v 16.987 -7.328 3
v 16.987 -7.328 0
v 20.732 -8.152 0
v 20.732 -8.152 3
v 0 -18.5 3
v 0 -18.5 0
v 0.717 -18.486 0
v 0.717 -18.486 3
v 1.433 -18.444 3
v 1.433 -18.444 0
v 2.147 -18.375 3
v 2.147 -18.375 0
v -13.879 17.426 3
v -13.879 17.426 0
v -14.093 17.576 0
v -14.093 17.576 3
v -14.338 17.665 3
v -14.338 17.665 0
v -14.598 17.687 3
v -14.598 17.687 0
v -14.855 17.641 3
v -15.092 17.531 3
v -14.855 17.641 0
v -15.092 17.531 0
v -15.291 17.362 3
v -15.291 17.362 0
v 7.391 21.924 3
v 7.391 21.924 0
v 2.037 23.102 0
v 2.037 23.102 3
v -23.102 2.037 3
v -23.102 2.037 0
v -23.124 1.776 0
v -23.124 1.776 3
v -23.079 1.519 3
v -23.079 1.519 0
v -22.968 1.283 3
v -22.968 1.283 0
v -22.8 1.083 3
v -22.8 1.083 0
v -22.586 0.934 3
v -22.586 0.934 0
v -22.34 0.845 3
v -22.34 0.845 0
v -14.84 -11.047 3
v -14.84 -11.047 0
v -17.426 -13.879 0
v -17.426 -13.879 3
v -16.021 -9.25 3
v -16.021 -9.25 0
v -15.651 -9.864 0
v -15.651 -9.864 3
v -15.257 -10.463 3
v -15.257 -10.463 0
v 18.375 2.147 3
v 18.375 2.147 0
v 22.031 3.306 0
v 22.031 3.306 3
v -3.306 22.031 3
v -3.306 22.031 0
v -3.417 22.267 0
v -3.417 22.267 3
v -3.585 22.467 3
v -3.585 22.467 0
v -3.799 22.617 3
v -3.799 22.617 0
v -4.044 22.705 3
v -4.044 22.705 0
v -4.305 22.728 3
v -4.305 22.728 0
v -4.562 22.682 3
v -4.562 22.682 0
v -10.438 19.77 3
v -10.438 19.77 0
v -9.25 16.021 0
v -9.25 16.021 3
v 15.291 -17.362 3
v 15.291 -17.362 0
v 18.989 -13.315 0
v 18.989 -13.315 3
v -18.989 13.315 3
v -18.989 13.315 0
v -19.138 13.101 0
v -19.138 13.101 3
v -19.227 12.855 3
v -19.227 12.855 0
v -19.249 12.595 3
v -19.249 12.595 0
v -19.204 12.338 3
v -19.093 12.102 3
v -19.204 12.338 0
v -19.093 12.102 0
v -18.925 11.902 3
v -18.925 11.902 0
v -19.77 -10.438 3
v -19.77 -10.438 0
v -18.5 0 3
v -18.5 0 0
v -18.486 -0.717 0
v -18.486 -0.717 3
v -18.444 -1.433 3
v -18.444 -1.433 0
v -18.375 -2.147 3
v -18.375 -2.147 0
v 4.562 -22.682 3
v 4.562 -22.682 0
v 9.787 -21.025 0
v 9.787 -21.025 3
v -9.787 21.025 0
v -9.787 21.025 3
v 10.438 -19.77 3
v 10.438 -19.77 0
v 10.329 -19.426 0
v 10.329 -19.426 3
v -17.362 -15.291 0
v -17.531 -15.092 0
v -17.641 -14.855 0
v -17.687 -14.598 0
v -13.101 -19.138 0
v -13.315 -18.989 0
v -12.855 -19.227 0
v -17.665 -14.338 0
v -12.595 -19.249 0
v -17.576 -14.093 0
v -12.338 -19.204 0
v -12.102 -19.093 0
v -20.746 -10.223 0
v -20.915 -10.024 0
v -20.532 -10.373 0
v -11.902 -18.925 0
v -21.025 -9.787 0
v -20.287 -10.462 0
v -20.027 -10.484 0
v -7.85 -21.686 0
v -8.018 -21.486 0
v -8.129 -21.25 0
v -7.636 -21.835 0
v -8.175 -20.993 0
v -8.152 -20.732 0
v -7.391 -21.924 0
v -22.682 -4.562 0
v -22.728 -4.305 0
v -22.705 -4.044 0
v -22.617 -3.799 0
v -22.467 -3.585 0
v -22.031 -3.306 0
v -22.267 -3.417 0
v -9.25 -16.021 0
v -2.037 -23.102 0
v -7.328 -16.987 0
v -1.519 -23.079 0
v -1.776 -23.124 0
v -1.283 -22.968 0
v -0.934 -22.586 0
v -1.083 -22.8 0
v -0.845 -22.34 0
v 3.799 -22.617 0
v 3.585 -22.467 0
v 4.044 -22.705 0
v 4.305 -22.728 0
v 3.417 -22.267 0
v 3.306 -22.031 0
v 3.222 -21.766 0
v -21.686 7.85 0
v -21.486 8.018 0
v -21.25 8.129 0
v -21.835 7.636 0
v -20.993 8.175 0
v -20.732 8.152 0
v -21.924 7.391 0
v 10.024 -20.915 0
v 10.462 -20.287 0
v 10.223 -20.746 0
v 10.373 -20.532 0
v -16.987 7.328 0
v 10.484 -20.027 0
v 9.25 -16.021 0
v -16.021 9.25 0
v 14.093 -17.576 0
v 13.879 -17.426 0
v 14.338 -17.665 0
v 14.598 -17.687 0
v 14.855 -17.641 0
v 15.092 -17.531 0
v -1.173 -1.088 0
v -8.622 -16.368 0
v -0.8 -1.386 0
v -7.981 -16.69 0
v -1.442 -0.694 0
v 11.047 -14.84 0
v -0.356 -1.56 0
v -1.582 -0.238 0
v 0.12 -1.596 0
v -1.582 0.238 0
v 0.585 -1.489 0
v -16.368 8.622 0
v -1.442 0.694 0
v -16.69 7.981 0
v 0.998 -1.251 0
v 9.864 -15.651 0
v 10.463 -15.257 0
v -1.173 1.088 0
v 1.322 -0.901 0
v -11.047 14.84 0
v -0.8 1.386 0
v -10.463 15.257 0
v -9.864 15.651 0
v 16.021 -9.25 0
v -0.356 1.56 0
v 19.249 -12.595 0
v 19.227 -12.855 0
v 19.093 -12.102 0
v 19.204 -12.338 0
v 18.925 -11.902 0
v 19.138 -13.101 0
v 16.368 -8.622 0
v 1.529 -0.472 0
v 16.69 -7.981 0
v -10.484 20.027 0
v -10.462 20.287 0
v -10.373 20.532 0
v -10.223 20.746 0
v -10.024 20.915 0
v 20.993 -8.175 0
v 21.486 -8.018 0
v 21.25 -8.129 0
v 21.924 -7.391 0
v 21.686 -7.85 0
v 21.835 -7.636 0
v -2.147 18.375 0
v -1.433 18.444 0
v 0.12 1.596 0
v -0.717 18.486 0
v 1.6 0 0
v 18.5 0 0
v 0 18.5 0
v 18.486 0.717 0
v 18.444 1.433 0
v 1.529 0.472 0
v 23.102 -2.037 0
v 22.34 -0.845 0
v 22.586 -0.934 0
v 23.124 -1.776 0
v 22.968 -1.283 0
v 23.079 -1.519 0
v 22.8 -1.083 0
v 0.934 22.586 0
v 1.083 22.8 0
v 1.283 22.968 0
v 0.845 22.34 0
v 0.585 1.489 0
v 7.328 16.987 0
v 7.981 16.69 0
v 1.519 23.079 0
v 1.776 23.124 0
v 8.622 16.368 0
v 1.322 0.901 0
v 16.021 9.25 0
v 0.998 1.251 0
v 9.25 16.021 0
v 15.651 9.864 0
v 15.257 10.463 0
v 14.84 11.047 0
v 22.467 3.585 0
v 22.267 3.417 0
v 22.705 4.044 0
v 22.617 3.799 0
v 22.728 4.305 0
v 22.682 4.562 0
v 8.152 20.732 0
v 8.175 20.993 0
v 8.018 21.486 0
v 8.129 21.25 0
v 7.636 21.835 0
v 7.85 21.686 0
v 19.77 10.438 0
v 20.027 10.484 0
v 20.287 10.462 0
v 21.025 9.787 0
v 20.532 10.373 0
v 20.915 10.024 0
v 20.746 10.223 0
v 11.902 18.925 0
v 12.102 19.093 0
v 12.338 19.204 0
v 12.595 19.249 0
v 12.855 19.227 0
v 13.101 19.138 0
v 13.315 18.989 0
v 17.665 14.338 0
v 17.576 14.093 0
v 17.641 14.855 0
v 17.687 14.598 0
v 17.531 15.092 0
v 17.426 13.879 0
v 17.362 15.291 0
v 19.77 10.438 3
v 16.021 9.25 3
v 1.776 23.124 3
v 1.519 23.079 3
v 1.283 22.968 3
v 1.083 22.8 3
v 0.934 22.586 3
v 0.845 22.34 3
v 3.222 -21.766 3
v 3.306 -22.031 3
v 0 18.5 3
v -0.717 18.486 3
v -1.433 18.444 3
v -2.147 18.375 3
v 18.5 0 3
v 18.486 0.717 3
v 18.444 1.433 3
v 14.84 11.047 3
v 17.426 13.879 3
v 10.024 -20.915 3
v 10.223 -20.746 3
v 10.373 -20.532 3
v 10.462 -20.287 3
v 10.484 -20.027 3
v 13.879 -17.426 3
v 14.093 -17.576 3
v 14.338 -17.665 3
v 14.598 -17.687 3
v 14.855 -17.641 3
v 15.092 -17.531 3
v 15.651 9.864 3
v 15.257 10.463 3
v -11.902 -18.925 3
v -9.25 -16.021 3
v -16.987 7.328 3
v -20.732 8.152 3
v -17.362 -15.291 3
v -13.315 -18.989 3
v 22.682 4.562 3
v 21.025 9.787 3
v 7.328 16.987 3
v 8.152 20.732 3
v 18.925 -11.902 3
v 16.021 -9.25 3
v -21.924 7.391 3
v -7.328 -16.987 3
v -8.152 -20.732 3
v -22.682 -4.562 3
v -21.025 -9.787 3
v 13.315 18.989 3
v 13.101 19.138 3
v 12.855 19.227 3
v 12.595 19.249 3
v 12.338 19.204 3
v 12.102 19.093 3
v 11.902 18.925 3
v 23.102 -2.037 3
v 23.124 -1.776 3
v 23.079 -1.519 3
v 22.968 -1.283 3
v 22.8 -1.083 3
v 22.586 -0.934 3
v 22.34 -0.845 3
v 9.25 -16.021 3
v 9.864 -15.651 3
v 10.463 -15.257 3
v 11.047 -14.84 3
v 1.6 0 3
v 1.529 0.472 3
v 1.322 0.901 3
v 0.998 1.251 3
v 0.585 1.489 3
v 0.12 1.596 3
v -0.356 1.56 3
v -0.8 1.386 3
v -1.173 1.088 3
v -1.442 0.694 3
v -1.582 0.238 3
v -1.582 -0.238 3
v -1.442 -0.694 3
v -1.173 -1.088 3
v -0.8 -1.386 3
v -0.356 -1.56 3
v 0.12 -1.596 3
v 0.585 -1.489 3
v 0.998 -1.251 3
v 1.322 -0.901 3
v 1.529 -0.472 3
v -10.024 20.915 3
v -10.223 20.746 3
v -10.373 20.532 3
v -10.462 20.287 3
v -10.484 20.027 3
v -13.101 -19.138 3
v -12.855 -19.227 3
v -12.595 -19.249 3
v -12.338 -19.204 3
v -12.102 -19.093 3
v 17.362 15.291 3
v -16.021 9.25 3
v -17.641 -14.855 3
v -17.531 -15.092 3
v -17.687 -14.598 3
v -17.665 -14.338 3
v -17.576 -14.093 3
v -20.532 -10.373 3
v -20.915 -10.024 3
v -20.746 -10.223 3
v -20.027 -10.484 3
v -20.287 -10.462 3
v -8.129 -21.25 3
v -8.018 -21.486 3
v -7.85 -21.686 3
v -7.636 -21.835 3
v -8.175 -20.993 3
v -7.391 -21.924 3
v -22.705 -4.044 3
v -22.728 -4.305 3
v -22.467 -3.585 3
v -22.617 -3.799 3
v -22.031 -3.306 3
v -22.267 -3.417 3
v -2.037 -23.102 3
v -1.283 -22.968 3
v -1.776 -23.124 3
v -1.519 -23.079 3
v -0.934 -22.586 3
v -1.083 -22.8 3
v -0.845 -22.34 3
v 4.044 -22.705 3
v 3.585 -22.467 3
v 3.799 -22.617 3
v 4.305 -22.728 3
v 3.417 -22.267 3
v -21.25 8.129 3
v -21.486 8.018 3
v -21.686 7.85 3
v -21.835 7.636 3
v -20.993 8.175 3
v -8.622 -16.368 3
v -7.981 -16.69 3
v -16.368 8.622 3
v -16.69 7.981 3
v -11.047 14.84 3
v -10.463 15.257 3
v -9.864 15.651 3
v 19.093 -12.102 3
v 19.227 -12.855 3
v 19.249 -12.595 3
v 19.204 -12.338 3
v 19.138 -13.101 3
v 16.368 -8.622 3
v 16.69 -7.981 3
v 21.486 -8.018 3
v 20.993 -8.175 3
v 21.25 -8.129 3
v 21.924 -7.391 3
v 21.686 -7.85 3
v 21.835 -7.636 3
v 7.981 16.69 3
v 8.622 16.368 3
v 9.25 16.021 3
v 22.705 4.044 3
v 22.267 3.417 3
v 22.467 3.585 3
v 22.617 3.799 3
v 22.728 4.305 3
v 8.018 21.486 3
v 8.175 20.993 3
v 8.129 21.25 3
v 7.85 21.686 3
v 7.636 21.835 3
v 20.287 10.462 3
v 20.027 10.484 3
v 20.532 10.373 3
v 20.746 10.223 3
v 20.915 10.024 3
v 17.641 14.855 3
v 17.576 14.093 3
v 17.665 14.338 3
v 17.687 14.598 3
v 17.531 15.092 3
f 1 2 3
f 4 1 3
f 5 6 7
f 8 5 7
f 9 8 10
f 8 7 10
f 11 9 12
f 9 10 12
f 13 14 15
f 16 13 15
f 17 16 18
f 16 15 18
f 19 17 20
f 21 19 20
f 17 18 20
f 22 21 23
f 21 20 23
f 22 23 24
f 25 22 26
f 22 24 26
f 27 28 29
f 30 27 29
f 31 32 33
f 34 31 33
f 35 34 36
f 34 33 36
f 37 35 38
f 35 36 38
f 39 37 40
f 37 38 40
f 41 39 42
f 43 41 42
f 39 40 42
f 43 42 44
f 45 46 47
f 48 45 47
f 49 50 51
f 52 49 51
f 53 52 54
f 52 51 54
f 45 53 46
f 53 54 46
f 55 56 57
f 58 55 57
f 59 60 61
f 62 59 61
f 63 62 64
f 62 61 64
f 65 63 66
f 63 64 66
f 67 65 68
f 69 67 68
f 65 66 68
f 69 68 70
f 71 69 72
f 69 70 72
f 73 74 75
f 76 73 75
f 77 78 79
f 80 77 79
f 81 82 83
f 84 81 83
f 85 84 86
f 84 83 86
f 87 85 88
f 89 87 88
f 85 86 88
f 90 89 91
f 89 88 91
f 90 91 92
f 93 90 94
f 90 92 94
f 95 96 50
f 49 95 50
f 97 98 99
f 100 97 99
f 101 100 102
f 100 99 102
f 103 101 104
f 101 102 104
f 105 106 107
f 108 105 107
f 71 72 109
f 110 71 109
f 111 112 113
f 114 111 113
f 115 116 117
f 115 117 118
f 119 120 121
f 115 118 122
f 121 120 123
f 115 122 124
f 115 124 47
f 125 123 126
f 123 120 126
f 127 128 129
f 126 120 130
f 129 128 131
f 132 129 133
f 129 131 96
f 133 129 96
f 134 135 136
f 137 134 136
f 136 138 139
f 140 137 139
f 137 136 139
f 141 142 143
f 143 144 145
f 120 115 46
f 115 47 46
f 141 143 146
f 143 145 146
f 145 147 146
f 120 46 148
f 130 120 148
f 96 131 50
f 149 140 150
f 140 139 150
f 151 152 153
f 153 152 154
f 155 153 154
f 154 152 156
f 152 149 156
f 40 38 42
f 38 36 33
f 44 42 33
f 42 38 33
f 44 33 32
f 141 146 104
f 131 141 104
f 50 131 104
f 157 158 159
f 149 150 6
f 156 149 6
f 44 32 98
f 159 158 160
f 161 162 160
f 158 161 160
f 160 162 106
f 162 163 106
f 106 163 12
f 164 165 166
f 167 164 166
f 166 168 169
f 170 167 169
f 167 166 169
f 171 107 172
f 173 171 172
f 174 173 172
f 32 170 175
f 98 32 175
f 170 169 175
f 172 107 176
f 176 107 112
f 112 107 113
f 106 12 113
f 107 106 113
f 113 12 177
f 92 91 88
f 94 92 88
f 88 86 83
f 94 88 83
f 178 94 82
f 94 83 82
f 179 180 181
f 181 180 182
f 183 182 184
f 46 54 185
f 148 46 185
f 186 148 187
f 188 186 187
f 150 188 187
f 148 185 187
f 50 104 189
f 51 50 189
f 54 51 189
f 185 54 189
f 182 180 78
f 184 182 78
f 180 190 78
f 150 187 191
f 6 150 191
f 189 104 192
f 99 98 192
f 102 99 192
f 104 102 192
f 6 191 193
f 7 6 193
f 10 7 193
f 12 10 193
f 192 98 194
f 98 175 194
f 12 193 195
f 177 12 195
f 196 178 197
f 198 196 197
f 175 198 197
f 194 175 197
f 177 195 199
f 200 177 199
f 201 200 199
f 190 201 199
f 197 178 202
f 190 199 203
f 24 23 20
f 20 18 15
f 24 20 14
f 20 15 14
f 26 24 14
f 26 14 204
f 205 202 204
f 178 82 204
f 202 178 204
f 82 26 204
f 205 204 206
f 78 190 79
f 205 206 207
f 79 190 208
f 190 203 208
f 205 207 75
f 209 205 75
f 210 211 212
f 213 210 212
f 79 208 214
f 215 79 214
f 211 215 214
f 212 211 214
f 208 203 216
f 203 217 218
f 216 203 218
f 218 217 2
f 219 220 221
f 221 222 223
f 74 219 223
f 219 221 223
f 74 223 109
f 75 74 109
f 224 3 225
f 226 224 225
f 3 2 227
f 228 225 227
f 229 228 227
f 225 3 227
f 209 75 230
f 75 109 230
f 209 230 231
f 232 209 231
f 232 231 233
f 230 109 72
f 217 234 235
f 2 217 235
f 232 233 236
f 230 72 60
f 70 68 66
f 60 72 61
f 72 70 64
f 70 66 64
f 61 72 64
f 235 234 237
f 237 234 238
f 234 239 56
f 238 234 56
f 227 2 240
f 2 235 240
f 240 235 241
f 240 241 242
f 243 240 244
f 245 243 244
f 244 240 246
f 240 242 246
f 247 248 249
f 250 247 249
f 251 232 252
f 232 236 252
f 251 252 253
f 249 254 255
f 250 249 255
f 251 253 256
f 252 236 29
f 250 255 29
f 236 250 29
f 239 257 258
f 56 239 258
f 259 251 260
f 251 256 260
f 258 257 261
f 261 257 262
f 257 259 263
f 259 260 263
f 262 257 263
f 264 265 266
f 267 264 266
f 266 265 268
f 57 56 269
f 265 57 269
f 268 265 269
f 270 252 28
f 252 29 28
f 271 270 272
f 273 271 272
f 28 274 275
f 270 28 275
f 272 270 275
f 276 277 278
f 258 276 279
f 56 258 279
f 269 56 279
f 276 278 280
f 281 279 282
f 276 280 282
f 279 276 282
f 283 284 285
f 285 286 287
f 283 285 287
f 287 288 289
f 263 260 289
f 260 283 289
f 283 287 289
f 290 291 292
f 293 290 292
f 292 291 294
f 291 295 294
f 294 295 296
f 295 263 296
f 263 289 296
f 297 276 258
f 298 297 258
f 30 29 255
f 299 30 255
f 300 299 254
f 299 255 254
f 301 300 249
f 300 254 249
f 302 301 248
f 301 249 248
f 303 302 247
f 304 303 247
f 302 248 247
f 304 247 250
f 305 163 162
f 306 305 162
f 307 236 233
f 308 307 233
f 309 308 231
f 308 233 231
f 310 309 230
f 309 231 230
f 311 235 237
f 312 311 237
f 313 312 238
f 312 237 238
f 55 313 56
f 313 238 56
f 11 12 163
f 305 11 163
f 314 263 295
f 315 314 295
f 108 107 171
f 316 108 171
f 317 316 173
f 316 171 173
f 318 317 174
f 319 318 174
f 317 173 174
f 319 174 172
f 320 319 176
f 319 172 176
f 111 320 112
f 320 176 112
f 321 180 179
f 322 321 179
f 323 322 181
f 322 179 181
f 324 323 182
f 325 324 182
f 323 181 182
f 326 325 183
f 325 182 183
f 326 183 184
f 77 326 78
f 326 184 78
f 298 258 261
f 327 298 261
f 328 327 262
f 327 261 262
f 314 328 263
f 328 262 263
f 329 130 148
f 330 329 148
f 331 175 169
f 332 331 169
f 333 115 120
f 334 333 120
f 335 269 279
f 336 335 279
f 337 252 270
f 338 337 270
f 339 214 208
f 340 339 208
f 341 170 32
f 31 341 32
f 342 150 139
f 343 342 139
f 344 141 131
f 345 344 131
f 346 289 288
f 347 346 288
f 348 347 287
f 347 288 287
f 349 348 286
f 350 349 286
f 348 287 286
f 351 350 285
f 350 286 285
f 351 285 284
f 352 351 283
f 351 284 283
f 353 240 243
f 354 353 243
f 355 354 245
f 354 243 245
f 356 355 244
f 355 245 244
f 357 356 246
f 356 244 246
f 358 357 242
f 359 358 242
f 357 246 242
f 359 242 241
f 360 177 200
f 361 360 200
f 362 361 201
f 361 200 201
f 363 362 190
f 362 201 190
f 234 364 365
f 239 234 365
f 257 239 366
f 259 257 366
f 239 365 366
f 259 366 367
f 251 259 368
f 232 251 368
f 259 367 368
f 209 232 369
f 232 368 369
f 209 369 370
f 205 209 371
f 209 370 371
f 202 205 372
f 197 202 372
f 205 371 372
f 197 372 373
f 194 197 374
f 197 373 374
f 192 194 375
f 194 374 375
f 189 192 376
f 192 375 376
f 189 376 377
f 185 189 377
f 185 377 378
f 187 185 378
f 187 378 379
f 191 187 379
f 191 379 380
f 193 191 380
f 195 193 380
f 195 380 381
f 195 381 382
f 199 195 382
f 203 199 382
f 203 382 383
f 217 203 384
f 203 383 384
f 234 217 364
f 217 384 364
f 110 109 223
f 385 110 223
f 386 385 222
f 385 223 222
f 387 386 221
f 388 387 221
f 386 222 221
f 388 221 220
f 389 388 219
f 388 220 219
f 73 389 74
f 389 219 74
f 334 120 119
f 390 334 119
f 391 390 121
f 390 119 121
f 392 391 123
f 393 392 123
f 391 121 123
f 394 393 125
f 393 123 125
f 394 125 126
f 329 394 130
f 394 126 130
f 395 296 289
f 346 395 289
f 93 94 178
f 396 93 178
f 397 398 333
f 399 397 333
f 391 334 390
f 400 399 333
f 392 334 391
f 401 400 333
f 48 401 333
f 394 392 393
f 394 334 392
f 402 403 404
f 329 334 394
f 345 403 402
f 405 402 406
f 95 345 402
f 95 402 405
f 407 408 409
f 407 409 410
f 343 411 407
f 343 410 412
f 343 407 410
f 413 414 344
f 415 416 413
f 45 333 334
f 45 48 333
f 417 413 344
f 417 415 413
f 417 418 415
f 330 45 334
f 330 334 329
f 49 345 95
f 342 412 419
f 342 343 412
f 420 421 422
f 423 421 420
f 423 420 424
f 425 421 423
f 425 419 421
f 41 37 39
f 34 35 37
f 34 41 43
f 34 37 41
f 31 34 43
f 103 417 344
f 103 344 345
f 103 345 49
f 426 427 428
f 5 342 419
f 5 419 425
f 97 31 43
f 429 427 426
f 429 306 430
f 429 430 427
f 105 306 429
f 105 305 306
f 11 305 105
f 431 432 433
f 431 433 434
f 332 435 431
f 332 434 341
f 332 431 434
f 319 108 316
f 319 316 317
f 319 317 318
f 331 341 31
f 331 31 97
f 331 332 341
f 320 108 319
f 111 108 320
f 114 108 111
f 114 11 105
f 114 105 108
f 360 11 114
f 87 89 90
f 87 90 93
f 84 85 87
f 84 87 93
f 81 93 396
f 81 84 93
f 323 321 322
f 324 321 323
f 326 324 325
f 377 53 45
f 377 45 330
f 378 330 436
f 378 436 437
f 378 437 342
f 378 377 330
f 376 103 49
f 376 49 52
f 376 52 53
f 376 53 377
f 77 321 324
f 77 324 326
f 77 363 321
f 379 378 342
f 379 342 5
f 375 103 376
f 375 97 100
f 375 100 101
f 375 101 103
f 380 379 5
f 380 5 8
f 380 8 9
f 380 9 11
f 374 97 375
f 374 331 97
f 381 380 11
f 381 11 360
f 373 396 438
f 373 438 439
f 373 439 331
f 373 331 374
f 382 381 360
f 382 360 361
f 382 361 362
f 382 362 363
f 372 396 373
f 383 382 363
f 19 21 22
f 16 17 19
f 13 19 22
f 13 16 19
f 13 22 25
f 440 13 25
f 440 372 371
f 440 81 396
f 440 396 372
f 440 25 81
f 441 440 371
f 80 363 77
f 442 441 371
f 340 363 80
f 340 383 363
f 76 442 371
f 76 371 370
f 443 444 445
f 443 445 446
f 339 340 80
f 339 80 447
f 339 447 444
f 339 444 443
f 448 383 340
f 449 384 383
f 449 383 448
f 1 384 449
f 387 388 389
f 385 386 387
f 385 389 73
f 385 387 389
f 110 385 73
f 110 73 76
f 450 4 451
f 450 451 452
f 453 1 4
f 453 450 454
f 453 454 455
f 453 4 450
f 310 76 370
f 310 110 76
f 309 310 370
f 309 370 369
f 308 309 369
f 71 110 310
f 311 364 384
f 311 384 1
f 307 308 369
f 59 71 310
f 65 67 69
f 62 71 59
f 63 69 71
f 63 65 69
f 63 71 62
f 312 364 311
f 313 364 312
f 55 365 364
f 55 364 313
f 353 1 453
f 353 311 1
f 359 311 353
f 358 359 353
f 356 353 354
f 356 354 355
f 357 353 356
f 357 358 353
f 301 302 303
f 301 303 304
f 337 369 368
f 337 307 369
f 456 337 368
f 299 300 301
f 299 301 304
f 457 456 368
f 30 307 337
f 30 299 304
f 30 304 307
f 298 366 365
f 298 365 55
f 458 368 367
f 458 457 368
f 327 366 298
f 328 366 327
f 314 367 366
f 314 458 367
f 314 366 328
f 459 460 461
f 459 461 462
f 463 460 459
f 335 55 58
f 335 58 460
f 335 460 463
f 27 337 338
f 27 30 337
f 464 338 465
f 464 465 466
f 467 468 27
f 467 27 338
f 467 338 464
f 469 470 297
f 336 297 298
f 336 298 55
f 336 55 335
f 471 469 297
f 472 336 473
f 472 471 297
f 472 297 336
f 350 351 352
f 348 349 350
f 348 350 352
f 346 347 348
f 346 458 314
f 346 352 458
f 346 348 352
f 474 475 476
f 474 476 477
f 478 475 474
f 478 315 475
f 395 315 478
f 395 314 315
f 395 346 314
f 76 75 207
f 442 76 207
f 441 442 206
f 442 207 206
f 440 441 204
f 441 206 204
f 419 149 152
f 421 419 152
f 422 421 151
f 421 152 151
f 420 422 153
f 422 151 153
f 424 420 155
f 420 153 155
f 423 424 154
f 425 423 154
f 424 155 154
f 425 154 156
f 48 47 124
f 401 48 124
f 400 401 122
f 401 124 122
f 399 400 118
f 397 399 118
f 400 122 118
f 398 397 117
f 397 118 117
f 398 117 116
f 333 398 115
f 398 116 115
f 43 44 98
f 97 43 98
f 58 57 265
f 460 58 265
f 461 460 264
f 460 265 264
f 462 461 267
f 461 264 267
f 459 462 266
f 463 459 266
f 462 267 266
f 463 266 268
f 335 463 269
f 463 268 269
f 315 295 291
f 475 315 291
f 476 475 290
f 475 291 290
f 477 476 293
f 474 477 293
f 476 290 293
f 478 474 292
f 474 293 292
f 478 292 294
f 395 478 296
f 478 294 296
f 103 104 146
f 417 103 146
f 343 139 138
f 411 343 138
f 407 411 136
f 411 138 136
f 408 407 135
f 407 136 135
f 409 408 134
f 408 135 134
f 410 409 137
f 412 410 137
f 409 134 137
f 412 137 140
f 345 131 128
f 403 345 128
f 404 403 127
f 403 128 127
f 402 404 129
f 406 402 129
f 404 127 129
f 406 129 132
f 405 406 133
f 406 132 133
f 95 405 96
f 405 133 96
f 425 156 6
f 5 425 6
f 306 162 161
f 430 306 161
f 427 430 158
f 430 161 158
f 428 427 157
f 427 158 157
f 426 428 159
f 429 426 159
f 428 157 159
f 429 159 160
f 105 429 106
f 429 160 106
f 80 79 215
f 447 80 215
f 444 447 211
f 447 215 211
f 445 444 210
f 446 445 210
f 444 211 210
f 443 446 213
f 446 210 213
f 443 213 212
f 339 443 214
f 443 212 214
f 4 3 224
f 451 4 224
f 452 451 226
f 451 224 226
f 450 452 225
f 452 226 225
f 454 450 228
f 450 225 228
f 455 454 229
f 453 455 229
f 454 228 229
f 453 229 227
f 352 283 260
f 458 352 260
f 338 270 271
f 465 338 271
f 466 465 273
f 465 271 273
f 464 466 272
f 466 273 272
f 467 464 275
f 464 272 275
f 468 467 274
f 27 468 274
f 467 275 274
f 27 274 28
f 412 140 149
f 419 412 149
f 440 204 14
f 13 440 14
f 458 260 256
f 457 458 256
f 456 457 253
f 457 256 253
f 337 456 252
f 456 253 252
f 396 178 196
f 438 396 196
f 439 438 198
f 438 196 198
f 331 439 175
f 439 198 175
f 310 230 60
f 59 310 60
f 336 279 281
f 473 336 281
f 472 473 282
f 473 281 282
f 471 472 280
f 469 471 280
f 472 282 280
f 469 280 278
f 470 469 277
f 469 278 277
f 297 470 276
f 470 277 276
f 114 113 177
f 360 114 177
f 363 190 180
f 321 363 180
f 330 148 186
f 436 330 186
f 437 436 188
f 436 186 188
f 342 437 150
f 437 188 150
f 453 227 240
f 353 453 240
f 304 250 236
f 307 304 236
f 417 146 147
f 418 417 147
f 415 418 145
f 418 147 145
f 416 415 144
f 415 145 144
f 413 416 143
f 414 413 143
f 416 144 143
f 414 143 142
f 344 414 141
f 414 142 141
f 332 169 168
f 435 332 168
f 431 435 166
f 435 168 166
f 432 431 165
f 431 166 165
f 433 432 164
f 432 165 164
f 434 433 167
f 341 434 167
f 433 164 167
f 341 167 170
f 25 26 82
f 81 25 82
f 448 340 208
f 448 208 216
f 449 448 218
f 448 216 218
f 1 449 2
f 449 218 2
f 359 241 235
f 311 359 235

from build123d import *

# Parameters (mm, degrees)
SKETCH1_R           = 18.5
BOSS_EXTRUDE1_DEPTH = 3
BOSS_EXTRUDE2_START = -3
BOSS_EXTRUDE2_DEPTH = 3
SKETCH3_R           = 1.6
CUT_EXTRUDE1_DEPTH  = 3


with BuildPart() as part:
    # Sketch1 → Boss-Extrude1 (new body)
    with BuildSketch(Plane.XY):
        Circle(SKETCH1_R)
    extrude(amount=BOSS_EXTRUDE1_DEPTH)

    # Sketch2 → Boss-Extrude2 (add)
    with BuildSketch(Plane.XY.offset(3).offset(BOSS_EXTRUDE2_START)):
        with BuildLine():
            Line((0.845055361, 22.340372437), (0, 18.5))
            ThreePointArc((0, 18.5), (3.741363138, 18.117731698), (7.32810957, 16.986724526))
            Line((7.32810957, 16.986724526), (8.152336268, 20.732440653))
            ThreePointArc((8.152336268, 20.732440653), (8.018246407, 21.485969914), (7.390604906, 21.923979714))
            Line((7.390604906, 21.923979714), (2.036594422, 23.102103799))
            ThreePointArc((2.036594422, 23.102103799), (1.283065161, 22.968013938), (0.845055361, 22.340372437))
        make_face()
        with BuildLine():
            Line((14.839691312, 11.046880182), (17.426350635, 13.878652154))
            ThreePointArc((17.426350635, 13.878652154), (17.686990039, 14.598272567), (17.362441455, 15.291420931))
            Line((17.362441455, 15.291420931), (13.314794406, 18.98871156))
            ThreePointArc((13.314794406, 18.98871156), (12.595173993, 19.249350964), (11.902025629, 18.92480238))
            Line((11.902025629, 18.92480238), (9.25, 16.02146997))
            ThreePointArc((9.25, 16.02146997), (12.298981371, 13.81973434), (14.839691312, 11.046880182))
        make_face()
        with BuildLine():
            Line((18.374989752, 2.147033214), (22.030988422, 3.306090019))
            ThreePointArc((22.030988422, 3.306090019), (22.616518974, 3.798979875), (22.682025838, 4.561538259))
            Line((22.682025838, 4.561538259), (21.025305982, 9.787309393))
            ThreePointArc((21.025305982, 9.787309393), (20.532416125, 10.372839945), (19.769857741, 10.438346808))
            Line((19.769857741, 10.438346808), (16.02146997, 9.25))
            ThreePointArc((16.02146997, 9.25), (17.561097478, 5.818750327), (18.374989752, 2.147033214))
        make_face()
        with BuildLine():
            Line((16.986724526, -7.32810957), (20.732440653, -8.152336268))
            ThreePointArc((20.732440653, -8.152336268), (21.485969914, -8.018246407), (21.923979714, -7.390604906))
            Line((21.923979714, -7.390604906), (23.102103799, -2.036594422))
            ThreePointArc((23.102103799, -2.036594422), (22.968013938, -1.283065161), (22.340372437, -0.845055361))
            Line((22.340372437, -0.845055361), (18.5, 0))
            ThreePointArc((18.5, 0), (18.117731698, -3.741363138), (16.986724526, -7.32810957))
        make_face()
        with BuildLine():
            Line((11.046880182, -14.839691312), (13.878652154, -17.426350635))
            ThreePointArc((13.878652154, -17.426350635), (14.598272567, -17.686990039), (15.291420931, -17.362441455))
            Line((15.291420931, -17.362441455), (18.98871156, -13.314794406))
            ThreePointArc((18.98871156, -13.314794406), (19.249350964, -12.595173993), (18.92480238, -11.902025629))
            Line((18.92480238, -11.902025629), (16.02146997, -9.25))
            ThreePointArc((16.02146997, -9.25), (13.81973434, -12.298981371), (11.046880182, -14.839691312))
        make_face()
        with BuildLine():
            Line((3.222223056, -21.766447889), (3.306090019, -22.030988422))
            ThreePointArc((3.306090019, -22.030988422), (3.798979875, -22.616518974), (4.561538259, -22.682025838))
            Line((4.561538259, -22.682025838), (9.787309393, -21.025305982))
            ThreePointArc((9.787309393, -21.025305982), (10.372839945, -20.532416125), (10.438346808, -19.769857741))
            Line((10.438346808, -19.769857741), (10.329178092, -19.425508197))
            Line((10.329178092, -19.425508197), (9.25, -16.02146997))
            ThreePointArc((9.25, -16.02146997), (5.818750327, -17.561097478), (2.147033214, -18.374989752))
            Line((2.147033214, -18.374989752), (3.222223056, -21.766447889))
        make_face()
        with BuildLine():
            Line((-7.32810957, -16.986724526), (-8.152336268, -20.732440653))
            ThreePointArc((-8.152336268, -20.732440653), (-8.018246407, -21.485969914), (-7.390604906, -21.923979714))
            Line((-7.390604906, -21.923979714), (-2.036594422, -23.102103799))
            ThreePointArc((-2.036594422, -23.102103799), (-1.283065161, -22.968013938), (-0.845055361, -22.340372437))
            Line((-0.845055361, -22.340372437), (0, -18.5))
            ThreePointArc((0, -18.5), (-3.741363138, -18.117731698), (-7.32810957, -16.986724526))
        make_face()
        with BuildLine():
            Line((-14.839691312, -11.046880182), (-17.426350635, -13.878652154))
            ThreePointArc((-17.426350635, -13.878652154), (-17.686990039, -14.598272567), (-17.362441455, -15.291420931))
            Line((-17.362441455, -15.291420931), (-13.314794406, -18.98871156))
            ThreePointArc((-13.314794406, -18.98871156), (-12.595173993, -19.249350964), (-11.902025629, -18.92480238))
            Line((-11.902025629, -18.92480238), (-9.25, -16.02146997))
            ThreePointArc((-9.25, -16.02146997), (-12.298981371, -13.81973434), (-14.839691312, -11.046880182))
        make_face()
        with BuildLine():
            Line((-18.374989752, -2.147033214), (-22.030988422, -3.306090019))
            ThreePointArc((-22.030988422, -3.306090019), (-22.616518974, -3.798979875), (-22.682025838, -4.561538259))
            Line((-22.682025838, -4.561538259), (-21.025305982, -9.787309393))
            ThreePointArc((-21.025305982, -9.787309393), (-20.532416125, -10.372839945), (-19.769857741, -10.438346808))
            Line((-19.769857741, -10.438346808), (-16.02146997, -9.25))
            ThreePointArc((-16.02146997, -9.25), (-17.561097478, -5.818750327), (-18.374989752, -2.147033214))
        make_face()
        with BuildLine():
            Line((-16.986724526, 7.32810957), (-20.732440653, 8.152336268))
            ThreePointArc((-20.732440653, 8.152336268), (-21.485969914, 8.018246407), (-21.923979714, 7.390604906))
            Line((-21.923979714, 7.390604906), (-23.102103799, 2.036594422))
            ThreePointArc((-23.102103799, 2.036594422), (-22.968013938, 1.283065161), (-22.340372437, 0.845055361))
            Line((-22.340372437, 0.845055361), (-18.5, 0))
            ThreePointArc((-18.5, 0), (-18.117731698, 3.741363138), (-16.986724526, 7.32810957))
        make_face()
        with BuildLine():
            Line((-11.046880182, 14.839691312), (-13.878652154, 17.426350635))
            ThreePointArc((-13.878652154, 17.426350635), (-14.598272567, 17.686990039), (-15.291420931, 17.362441455))
            Line((-15.291420931, 17.362441455), (-18.98871156, 13.314794406))
            ThreePointArc((-18.98871156, 13.314794406), (-19.249350964, 12.595173993), (-18.92480238, 11.902025629))
            Line((-18.92480238, 11.902025629), (-16.02146997, 9.25))
            ThreePointArc((-16.02146997, 9.25), (-13.81973434, 12.298981371), (-11.046880182, 14.839691312))
        make_face()
        with BuildLine():
            Line((-2.147033214, 18.374989752), (-3.306090019, 22.030988422))
            ThreePointArc((-3.306090019, 22.030988422), (-3.798979875, 22.616518974), (-4.561538259, 22.682025838))
            Line((-4.561538259, 22.682025838), (-9.787309393, 21.025305982))
            ThreePointArc((-9.787309393, 21.025305982), (-10.372839945, 20.532416125), (-10.438346808, 19.769857741))
            Line((-10.438346808, 19.769857741), (-9.25, 16.02146997))
            ThreePointArc((-9.25, 16.02146997), (-5.818750327, 17.561097478), (-2.147033214, 18.374989752))
        make_face()
    extrude(amount=BOSS_EXTRUDE2_DEPTH)

    # Sketch3 → Cut-Extrude1 (cut)
    with BuildSketch(Plane.XY.offset(3)):
        Circle(SKETCH3_R)
    extrude(amount=-CUT_EXTRUDE1_DEPTH, mode=Mode.SUBTRACT)


solid = part.part
